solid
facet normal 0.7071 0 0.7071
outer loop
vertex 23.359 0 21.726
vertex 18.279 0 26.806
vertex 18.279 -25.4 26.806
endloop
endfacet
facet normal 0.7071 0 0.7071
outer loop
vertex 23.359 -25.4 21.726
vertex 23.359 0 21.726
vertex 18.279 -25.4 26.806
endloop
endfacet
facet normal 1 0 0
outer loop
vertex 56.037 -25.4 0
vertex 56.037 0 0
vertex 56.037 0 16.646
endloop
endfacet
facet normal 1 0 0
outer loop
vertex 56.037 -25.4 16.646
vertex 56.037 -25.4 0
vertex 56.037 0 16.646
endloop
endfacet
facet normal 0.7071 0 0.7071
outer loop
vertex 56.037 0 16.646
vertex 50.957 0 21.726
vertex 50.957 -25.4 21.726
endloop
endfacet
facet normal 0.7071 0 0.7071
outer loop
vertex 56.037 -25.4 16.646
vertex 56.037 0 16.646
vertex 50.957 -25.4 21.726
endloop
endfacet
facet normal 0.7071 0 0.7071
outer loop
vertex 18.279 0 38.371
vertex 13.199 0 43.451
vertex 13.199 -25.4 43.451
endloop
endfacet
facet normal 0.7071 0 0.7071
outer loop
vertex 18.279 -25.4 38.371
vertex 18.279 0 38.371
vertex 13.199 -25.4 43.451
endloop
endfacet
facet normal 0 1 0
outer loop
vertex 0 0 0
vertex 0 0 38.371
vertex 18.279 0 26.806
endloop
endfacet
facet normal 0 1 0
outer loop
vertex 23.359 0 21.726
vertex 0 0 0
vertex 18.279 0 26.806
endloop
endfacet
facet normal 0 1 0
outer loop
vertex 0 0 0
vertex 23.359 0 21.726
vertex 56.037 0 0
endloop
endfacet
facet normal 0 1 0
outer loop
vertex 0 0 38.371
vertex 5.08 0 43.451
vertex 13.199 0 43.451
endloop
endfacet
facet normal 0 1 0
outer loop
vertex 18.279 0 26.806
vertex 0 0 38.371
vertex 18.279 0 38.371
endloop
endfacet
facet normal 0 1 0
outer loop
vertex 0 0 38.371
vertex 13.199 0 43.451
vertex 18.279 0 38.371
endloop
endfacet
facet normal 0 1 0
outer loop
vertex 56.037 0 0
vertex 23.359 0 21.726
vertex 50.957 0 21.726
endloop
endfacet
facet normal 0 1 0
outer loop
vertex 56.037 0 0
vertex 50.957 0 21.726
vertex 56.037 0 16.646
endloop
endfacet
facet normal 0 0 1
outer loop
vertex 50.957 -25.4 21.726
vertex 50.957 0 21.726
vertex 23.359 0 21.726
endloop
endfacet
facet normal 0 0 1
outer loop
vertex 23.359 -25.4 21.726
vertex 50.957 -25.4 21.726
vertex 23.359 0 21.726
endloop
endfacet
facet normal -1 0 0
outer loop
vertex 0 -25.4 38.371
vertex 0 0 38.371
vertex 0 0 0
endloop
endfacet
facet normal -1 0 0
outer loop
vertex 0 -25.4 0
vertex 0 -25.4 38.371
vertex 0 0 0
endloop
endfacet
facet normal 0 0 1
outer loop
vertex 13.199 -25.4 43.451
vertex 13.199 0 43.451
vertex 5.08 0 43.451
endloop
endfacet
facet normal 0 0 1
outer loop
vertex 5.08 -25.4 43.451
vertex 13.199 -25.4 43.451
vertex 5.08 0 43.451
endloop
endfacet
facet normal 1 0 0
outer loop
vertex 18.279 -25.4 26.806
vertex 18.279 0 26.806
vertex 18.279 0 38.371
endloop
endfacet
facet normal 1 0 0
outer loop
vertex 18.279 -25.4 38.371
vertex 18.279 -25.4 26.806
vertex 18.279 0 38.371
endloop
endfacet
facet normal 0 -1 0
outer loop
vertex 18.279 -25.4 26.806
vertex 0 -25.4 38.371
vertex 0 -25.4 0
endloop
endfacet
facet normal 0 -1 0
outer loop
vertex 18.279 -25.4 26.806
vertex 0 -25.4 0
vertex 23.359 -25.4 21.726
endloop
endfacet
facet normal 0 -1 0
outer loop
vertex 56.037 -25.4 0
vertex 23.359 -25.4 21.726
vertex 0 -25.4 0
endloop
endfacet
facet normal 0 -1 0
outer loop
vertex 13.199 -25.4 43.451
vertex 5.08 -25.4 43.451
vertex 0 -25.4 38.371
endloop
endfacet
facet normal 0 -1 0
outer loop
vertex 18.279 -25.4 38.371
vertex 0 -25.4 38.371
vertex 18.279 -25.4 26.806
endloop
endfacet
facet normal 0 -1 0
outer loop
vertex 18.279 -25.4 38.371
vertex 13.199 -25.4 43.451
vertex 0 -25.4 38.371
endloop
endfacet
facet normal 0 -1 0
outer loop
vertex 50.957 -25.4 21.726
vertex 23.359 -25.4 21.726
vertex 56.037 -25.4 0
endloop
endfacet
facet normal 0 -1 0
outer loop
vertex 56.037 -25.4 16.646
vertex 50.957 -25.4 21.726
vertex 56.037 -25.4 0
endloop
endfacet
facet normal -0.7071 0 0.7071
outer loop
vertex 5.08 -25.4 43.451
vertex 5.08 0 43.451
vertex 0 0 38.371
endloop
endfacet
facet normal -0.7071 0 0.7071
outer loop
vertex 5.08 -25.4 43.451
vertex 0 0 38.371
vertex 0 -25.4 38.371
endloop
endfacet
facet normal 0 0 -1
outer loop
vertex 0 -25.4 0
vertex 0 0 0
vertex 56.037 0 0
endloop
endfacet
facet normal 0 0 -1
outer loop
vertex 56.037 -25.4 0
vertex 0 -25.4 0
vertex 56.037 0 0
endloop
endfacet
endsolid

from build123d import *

# Parameters (mm, degrees)
F1_DEPTH = 25.4
F2_SIZE  = 5.08
F3_SIZE  = 5.08


with BuildPart() as f1:
    # F0 (on Front) → F1 (new body)
    with BuildSketch(Plane.XZ):
        Polygon((0, 43.451123), (0, 0), (56.036968, 0), (56.036968, 21.725561), (18.279437, 21.725561), (18.279437, 43.451123), align=None)
    extrude(amount=F1_DEPTH)

    # F2
    f2_edges = [f1.edges().sort_by_distance(p)[0] for p in [
        (56.036968, -12.7, 21.725561),
    ]]
    chamfer(f2_edges, length=F2_SIZE)

    # F3
    f3_edges = [f1.edges().sort_by_distance(p)[0] for p in [
        (18.279437, -12.7, 43.451123),
        (18.279437, -12.7, 21.725561),
        (0, -12.7, 43.451123),
    ]]
    chamfer(f3_edges, length=F3_SIZE)


solid = f1.part
